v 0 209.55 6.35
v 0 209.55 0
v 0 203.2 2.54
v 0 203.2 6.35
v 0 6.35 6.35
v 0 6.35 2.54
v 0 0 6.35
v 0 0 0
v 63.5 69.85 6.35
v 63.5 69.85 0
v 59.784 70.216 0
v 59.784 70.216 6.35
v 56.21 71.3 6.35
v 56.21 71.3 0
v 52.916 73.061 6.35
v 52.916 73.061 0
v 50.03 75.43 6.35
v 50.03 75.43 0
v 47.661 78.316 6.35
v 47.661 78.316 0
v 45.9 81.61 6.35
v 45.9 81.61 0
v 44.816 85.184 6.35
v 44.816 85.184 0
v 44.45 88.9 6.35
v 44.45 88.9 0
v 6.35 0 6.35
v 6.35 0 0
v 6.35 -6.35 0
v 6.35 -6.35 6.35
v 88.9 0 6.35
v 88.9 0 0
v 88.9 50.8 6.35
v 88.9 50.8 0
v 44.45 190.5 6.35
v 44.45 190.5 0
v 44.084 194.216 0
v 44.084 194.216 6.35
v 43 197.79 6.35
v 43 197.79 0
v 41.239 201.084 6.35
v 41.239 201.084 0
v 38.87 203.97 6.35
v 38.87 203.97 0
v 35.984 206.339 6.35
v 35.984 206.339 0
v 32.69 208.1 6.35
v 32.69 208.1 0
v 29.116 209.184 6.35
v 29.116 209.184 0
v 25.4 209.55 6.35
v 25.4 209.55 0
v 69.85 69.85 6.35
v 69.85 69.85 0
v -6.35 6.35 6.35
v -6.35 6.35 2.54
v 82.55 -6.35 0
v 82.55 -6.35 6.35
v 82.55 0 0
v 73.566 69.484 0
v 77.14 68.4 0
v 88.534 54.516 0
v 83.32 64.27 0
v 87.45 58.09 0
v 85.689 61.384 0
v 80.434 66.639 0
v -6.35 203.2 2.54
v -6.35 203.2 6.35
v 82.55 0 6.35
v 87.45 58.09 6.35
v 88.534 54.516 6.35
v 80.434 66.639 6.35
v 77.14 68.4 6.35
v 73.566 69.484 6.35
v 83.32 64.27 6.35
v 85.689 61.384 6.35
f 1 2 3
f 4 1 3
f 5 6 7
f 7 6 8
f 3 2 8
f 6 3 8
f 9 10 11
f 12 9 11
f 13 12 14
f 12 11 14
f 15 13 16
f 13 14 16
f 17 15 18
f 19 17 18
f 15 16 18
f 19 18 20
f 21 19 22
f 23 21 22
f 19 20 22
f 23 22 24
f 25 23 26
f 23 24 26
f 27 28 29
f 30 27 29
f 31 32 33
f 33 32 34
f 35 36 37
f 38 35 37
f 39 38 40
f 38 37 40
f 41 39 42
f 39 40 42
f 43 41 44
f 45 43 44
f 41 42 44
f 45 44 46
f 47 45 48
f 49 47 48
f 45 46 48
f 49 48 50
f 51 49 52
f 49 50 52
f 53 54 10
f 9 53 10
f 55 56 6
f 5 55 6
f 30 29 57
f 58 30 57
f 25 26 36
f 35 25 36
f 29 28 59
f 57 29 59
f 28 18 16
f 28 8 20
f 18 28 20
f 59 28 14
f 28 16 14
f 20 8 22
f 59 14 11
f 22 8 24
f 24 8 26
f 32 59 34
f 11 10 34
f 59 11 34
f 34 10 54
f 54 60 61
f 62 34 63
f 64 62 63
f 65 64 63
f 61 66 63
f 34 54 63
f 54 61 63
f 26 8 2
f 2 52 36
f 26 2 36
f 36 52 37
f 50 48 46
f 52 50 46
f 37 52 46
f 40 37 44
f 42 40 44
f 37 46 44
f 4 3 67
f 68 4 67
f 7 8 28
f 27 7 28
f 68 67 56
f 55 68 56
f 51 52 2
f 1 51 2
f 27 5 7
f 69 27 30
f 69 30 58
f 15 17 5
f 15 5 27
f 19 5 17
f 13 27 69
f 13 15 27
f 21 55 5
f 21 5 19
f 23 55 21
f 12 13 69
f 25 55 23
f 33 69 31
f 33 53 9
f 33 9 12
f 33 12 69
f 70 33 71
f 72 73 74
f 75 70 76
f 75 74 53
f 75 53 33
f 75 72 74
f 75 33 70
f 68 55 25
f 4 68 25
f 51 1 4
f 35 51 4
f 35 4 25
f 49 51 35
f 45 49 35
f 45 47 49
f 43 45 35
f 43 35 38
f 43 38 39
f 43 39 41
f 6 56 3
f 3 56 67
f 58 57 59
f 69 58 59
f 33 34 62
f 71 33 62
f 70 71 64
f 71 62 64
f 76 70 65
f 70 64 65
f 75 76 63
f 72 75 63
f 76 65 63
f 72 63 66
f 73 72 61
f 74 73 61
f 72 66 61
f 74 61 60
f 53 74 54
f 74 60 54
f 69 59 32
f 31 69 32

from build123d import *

# Parameters (mm, degrees)
SALIENTE_EXTRUIR3_DEPTH = 6.35
CROQUIS5_W              = 2.54
CROQUIS5_H              = 196.85
CORTAR_EXTRUIR1_DEPTH   = 6.35


with BuildPart() as part:
    # Croquis2 → Saliente-Extruir3 (new body)
    with BuildSketch(Plane.XY):
        with BuildLine():
            Line((0, 0), (6.35, 0))
            Line((6.35, 0), (6.35, -6.35))
            Line((6.35, -6.35), (82.55, -6.35))
            Line((82.55, -6.35), (82.55, 0))
            Line((82.55, 0), (88.9, 0))
            Line((88.9, 0), (88.9, 50.8))
            ThreePointArc((88.9, 50.8), (83.320384182, 64.270384182), (69.85, 69.85))
            Line((69.85, 69.85), (63.5, 69.85))
            ThreePointArc((63.5, 69.85), (50.029615818, 75.429615818), (44.45, 88.9))
            Line((44.45, 88.9), (44.45, 190.5))
            ThreePointArc((44.45, 190.5), (38.870384182, 203.970384182), (25.4, 209.55))
            Line((25.4, 209.55), (0, 209.55))
            Line((0, 209.55), (0, 203.2))
            Line((0, 203.2), (-6.35, 203.2))
            Line((-6.35, 203.2), (-6.35, 6.35))
            Line((-6.35, 6.35), (0, 6.35))
            Line((0, 6.35), (0, 0))
        make_face()
    extrude(amount=SALIENTE_EXTRUIR3_DEPTH)

    # Croquis5 → Cortar-Extruir1 (cut)
    with BuildSketch(Plane.ZY.offset(6.35)):
        with Locations((1.27, 104.775)):
            Rectangle(CROQUIS5_W, CROQUIS5_H)
    extrude(amount=-CORTAR_EXTRUIR1_DEPTH, mode=Mode.SUBTRACT)


solid = part.part
